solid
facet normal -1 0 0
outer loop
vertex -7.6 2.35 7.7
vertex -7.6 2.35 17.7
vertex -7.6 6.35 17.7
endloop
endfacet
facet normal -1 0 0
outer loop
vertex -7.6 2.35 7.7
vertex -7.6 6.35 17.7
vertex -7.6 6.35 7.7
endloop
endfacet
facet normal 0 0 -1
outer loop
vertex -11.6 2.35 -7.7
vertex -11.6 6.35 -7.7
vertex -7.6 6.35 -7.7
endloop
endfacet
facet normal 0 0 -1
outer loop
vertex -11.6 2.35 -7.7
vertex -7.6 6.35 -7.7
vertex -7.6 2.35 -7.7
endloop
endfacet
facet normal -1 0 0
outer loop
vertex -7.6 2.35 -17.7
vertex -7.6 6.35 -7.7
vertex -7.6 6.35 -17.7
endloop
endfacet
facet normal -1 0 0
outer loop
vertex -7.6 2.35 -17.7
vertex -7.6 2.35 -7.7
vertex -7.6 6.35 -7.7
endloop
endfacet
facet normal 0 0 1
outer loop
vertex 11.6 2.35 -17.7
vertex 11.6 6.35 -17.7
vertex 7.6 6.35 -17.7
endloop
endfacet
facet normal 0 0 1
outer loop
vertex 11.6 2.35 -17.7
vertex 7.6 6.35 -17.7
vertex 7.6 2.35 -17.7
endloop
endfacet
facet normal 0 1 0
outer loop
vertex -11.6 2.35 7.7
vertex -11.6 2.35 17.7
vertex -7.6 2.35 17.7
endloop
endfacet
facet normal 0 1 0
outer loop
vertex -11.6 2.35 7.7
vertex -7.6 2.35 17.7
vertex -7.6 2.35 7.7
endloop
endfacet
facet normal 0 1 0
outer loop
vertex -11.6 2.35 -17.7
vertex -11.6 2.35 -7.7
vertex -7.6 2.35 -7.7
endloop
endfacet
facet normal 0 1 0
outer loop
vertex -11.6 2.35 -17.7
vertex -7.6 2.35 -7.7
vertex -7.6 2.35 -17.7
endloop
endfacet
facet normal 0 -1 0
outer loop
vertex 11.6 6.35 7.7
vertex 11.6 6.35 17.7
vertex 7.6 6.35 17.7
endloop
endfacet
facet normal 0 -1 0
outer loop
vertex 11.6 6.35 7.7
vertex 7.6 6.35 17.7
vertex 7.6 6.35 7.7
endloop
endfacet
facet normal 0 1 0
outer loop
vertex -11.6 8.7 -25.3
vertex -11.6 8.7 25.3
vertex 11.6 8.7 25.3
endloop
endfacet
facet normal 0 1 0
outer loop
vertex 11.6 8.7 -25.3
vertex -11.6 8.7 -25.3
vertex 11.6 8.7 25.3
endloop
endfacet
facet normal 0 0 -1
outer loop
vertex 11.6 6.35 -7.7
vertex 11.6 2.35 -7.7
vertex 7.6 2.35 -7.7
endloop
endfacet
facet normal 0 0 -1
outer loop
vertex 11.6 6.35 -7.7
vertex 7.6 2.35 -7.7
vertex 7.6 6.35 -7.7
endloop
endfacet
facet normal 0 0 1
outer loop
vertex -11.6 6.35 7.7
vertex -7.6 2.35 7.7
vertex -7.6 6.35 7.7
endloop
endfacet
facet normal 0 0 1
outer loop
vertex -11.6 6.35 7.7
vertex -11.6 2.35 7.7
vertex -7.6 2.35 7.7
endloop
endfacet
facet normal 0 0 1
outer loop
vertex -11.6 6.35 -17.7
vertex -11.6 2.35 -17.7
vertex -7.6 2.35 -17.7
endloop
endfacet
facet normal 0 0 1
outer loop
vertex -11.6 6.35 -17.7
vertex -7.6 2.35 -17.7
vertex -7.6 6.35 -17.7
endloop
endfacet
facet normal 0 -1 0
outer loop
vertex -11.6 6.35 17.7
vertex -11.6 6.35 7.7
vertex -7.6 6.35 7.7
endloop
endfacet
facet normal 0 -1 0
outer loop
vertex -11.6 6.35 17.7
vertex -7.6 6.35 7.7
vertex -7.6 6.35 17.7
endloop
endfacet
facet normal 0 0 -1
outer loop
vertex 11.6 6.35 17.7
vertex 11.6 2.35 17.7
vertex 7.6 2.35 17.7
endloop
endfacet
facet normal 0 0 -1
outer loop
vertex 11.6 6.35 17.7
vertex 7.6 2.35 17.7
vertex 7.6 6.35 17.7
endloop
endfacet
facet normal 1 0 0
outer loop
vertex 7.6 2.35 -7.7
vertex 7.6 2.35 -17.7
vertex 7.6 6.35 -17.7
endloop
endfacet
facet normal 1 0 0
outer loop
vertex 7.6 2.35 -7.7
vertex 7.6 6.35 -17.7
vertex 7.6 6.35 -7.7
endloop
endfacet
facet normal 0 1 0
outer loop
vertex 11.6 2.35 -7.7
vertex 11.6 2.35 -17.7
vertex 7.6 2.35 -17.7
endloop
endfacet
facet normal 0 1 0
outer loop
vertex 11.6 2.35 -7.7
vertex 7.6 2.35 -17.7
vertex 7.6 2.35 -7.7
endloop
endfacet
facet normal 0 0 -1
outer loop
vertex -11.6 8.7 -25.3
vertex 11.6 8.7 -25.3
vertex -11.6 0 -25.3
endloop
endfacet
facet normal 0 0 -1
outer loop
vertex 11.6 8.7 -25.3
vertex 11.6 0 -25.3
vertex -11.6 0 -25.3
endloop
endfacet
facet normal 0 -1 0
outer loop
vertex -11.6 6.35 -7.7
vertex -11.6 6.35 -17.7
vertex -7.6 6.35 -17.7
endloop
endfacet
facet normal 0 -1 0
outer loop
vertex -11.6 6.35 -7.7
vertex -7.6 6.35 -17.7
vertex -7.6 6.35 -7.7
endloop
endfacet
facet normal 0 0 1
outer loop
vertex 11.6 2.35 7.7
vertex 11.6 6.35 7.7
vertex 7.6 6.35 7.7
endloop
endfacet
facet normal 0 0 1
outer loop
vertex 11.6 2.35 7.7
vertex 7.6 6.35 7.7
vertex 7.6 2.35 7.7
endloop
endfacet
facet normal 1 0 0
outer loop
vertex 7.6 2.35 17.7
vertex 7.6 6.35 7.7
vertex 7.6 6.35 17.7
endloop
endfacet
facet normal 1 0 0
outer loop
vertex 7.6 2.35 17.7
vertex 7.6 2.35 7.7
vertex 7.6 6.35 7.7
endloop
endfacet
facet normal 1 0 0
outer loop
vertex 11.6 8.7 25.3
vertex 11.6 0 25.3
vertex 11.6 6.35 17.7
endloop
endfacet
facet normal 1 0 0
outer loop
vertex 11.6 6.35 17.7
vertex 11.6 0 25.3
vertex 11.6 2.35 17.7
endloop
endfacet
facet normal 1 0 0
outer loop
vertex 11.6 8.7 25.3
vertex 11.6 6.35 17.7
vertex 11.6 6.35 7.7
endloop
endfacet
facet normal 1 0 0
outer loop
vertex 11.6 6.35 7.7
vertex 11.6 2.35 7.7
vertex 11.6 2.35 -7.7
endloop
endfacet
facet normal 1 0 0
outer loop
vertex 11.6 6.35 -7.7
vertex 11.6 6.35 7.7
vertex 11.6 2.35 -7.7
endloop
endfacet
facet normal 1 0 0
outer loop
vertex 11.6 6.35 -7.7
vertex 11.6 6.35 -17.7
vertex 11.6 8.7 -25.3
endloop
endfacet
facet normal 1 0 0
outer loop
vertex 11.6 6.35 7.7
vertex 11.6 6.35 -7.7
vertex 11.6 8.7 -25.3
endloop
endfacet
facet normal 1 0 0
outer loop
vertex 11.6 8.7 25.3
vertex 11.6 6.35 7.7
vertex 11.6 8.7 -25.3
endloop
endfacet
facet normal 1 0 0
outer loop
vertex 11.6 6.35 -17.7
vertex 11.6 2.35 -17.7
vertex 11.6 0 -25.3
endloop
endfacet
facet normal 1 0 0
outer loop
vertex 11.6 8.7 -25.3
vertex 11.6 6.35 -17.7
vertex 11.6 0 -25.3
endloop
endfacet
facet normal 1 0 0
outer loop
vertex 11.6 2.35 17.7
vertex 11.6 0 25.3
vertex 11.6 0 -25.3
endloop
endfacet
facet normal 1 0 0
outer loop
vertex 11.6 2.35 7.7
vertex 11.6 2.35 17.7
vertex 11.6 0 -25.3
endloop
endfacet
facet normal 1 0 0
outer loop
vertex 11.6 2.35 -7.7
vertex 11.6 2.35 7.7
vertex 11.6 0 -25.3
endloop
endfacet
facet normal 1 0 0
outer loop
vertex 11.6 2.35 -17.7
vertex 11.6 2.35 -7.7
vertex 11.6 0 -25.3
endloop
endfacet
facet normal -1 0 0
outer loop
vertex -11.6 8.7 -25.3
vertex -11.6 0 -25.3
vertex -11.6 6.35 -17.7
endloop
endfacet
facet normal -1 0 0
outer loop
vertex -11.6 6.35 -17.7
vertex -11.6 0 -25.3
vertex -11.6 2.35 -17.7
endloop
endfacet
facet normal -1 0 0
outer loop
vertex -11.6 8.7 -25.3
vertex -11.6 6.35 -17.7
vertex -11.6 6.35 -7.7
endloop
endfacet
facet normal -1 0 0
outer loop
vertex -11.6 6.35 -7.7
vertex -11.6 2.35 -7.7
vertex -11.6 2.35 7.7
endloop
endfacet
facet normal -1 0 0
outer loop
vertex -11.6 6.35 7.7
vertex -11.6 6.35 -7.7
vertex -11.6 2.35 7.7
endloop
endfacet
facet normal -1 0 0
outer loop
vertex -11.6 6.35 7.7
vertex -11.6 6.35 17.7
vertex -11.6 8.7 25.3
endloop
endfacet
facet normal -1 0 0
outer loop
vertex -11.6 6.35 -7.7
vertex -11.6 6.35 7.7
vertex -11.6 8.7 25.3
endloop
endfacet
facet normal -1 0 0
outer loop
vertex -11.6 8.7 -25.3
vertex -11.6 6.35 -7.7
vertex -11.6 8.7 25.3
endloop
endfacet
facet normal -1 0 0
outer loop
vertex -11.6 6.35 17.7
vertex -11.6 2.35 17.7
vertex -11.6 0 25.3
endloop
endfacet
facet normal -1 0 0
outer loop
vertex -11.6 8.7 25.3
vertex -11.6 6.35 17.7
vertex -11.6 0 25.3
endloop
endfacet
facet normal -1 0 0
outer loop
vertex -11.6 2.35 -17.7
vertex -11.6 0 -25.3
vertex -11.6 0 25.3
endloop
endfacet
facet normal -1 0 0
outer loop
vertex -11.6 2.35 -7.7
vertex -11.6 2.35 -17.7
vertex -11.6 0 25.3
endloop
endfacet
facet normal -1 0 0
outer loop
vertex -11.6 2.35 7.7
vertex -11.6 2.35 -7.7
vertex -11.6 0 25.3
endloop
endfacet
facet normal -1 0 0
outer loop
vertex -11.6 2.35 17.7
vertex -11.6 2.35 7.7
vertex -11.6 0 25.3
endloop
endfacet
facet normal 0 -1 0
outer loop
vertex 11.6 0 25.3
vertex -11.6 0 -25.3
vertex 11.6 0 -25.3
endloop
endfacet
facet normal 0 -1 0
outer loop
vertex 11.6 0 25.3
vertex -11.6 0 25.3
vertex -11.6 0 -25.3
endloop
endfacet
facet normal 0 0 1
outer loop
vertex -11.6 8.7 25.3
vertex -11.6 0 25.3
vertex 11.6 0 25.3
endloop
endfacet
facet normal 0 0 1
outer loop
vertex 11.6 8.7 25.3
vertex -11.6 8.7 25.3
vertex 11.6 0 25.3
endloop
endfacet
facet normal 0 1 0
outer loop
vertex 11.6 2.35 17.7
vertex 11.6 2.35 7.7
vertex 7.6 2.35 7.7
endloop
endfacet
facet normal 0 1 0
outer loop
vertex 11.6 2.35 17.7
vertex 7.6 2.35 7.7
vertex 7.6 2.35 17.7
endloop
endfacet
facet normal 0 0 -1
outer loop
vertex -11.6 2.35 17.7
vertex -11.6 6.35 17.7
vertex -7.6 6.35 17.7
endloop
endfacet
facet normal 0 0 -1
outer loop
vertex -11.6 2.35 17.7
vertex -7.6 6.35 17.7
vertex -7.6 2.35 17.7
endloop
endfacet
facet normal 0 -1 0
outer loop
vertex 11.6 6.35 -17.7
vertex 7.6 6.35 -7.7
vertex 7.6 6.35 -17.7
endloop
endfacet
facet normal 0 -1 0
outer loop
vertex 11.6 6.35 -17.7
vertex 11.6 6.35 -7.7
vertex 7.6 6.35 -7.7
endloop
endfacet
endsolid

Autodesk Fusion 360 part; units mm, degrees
sketch "Sketch1" plane through (0, 0, 0) normal (0, -1, 0) x (1, 0, 0) in component "DDD Wall Control Center Piece Parametric Template"
  line L0 (11.6, -25.3) -> (-11.6, -25.3)
  line L1 (-11.6, -25.3) -> (-11.6, 25.3)
  line L2 (-11.6, 25.3) -> (11.6, 25.3)
  line L3 (11.6, 25.3) -> (11.6, -25.3)
  line L4 (11.6, -25.3) -> (-11.6, 25.3) construction
  line L5 (-11.6, -25.3) -> (11.6, 25.3) construction
  dimension "d1" = 23.2
  dimension "d2" = 50.6
extrude "Extrude1" add sketch "Sketch1" against normal blind 8.7 in component "DDD Wall Control Center Piece Parametric Template"
sketch "Sketch3" plane through (0, 0, 0) normal (1, 0, 0) x (0, 0, 1) in component "DDD Wall Control Center Piece Parametric Template"
  line L0 (-17.7, -2.35) -> (-7.7, -2.35)
  line L1 (-7.7, -2.35) -> (-7.7, -6.35)
  line L2 (-7.7, -6.35) -> (-17.7, -6.35)
  line L3 (-17.7, -6.35) -> (-17.7, -2.35)
  line L4 (-17.7, -2.35) -> (-7.7, -6.35) construction
  line L5 (-7.7, -2.35) -> (-17.7, -6.35) construction
  line L6 (1.75, 0) -> (22.5, 0)
  line L7 (25.3, 0) -> (-25.3, 0)
  point P0 (-12.7, -4.35)
  dimension "d165" = 10
  dimension "d166" = 4
  dimension "d189" = 17.7
  dimension "d205" = 2.35
extrude "Extrude3" cut sketch "Sketch3" against normal blind 4 from surface at 11.6 in component "DDD Wall Control Center Piece Parametric Template"
mirror "Mirror2" about plane through (0, 0, 0) normal (1, 0, 0) of "Extrude3" in component "DDD Wall Control Center Piece Parametric Template"
pattern_linear "R-Pattern4" count 2 spacing 25.4 along (0, 0, 1) of "Extrude3" in component "DDD Wall Control Center Piece Parametric Template"
mirror "Mirror1" about plane through (0, 0, 0) normal (1, 0, 0) of "R-Pattern4" in component "DDD Wall Control Center Piece Parametric Template"
component "DDD Wall Control Center Piece Parametric Template" placed x (1, 0, 0) y (0, 1, 0) z (0, 0, 1) at (0, 0, 0)
equation "d1 = HorizontalWidth"
equation "d2 = VerticalHeight"
equation "d3 = -Depth"
equation "d42 = -PinHoleWidth / 2"
equation "HowToUse = 0" comment "Save this as a new design   from the original to preserve the template.  Then modify as needed for centerpiece divider racks."
equation "d165 = PinHoleLength"
equation "d166 = PinHoleHeight"
equation "d168 = VerticalUnits"
equation "d170 = -SlotSpacing"
equation "HorizontalUnits = 1" comment "Units spanning horizontally across the wall control board/pegboard"
equation "VerticalUnits = 2" comment "Units spanning vertically down the wall control board/pegboard"
equation "SidepieceDepth = 8.7 mm" comment "Sidepiece depth used to ensure the spaces for the pins line up"
equation "HorizontalWidthBetweenSlots = SlotSpacing - SlotWidth" comment "The space between two slots in a wall control board"
equation "PinHoleLength = 10 mm"
equation "PinHoleWidth = 8 mm"
equation "PinHoleHeight = 4 mm"
equation "SlotSpacing = 25.4 mm" comment "Slots in wall control boards are spaced an inch apart"
equation "PinToEdgeLength = 7.6 mm" comment "Distance from the back edge of the center piece to the first pin"
equation "HorizontalWidth = ( HorizontalUnits - 1 ) * SlotSpacing + HorizontalWidthBetweenSlots"
equation "VerticalHeight = ( VerticalUnits - 1 ) * SlotSpacing + PinHoleLength + 2 * PinToEdgeLength"
equation "d189 = ( VerticalHeight / 2 ) - PinToEdgeLength"
equation "Depth = max(DepthOverride; PinHoleHeight + PinDepthOffset * 2)"
equation "SlotWidth = 2.2 mm"
equation "DepthOverride = 0 mm" comment "Add additional depth to the centerpiece. There is an enforced minimum to allow for the pins."
equation "PinDepthOffset = ( SidepieceDepth - PinHoleHeight ) / 2"
equation "d205 = PinDepthOffset"
